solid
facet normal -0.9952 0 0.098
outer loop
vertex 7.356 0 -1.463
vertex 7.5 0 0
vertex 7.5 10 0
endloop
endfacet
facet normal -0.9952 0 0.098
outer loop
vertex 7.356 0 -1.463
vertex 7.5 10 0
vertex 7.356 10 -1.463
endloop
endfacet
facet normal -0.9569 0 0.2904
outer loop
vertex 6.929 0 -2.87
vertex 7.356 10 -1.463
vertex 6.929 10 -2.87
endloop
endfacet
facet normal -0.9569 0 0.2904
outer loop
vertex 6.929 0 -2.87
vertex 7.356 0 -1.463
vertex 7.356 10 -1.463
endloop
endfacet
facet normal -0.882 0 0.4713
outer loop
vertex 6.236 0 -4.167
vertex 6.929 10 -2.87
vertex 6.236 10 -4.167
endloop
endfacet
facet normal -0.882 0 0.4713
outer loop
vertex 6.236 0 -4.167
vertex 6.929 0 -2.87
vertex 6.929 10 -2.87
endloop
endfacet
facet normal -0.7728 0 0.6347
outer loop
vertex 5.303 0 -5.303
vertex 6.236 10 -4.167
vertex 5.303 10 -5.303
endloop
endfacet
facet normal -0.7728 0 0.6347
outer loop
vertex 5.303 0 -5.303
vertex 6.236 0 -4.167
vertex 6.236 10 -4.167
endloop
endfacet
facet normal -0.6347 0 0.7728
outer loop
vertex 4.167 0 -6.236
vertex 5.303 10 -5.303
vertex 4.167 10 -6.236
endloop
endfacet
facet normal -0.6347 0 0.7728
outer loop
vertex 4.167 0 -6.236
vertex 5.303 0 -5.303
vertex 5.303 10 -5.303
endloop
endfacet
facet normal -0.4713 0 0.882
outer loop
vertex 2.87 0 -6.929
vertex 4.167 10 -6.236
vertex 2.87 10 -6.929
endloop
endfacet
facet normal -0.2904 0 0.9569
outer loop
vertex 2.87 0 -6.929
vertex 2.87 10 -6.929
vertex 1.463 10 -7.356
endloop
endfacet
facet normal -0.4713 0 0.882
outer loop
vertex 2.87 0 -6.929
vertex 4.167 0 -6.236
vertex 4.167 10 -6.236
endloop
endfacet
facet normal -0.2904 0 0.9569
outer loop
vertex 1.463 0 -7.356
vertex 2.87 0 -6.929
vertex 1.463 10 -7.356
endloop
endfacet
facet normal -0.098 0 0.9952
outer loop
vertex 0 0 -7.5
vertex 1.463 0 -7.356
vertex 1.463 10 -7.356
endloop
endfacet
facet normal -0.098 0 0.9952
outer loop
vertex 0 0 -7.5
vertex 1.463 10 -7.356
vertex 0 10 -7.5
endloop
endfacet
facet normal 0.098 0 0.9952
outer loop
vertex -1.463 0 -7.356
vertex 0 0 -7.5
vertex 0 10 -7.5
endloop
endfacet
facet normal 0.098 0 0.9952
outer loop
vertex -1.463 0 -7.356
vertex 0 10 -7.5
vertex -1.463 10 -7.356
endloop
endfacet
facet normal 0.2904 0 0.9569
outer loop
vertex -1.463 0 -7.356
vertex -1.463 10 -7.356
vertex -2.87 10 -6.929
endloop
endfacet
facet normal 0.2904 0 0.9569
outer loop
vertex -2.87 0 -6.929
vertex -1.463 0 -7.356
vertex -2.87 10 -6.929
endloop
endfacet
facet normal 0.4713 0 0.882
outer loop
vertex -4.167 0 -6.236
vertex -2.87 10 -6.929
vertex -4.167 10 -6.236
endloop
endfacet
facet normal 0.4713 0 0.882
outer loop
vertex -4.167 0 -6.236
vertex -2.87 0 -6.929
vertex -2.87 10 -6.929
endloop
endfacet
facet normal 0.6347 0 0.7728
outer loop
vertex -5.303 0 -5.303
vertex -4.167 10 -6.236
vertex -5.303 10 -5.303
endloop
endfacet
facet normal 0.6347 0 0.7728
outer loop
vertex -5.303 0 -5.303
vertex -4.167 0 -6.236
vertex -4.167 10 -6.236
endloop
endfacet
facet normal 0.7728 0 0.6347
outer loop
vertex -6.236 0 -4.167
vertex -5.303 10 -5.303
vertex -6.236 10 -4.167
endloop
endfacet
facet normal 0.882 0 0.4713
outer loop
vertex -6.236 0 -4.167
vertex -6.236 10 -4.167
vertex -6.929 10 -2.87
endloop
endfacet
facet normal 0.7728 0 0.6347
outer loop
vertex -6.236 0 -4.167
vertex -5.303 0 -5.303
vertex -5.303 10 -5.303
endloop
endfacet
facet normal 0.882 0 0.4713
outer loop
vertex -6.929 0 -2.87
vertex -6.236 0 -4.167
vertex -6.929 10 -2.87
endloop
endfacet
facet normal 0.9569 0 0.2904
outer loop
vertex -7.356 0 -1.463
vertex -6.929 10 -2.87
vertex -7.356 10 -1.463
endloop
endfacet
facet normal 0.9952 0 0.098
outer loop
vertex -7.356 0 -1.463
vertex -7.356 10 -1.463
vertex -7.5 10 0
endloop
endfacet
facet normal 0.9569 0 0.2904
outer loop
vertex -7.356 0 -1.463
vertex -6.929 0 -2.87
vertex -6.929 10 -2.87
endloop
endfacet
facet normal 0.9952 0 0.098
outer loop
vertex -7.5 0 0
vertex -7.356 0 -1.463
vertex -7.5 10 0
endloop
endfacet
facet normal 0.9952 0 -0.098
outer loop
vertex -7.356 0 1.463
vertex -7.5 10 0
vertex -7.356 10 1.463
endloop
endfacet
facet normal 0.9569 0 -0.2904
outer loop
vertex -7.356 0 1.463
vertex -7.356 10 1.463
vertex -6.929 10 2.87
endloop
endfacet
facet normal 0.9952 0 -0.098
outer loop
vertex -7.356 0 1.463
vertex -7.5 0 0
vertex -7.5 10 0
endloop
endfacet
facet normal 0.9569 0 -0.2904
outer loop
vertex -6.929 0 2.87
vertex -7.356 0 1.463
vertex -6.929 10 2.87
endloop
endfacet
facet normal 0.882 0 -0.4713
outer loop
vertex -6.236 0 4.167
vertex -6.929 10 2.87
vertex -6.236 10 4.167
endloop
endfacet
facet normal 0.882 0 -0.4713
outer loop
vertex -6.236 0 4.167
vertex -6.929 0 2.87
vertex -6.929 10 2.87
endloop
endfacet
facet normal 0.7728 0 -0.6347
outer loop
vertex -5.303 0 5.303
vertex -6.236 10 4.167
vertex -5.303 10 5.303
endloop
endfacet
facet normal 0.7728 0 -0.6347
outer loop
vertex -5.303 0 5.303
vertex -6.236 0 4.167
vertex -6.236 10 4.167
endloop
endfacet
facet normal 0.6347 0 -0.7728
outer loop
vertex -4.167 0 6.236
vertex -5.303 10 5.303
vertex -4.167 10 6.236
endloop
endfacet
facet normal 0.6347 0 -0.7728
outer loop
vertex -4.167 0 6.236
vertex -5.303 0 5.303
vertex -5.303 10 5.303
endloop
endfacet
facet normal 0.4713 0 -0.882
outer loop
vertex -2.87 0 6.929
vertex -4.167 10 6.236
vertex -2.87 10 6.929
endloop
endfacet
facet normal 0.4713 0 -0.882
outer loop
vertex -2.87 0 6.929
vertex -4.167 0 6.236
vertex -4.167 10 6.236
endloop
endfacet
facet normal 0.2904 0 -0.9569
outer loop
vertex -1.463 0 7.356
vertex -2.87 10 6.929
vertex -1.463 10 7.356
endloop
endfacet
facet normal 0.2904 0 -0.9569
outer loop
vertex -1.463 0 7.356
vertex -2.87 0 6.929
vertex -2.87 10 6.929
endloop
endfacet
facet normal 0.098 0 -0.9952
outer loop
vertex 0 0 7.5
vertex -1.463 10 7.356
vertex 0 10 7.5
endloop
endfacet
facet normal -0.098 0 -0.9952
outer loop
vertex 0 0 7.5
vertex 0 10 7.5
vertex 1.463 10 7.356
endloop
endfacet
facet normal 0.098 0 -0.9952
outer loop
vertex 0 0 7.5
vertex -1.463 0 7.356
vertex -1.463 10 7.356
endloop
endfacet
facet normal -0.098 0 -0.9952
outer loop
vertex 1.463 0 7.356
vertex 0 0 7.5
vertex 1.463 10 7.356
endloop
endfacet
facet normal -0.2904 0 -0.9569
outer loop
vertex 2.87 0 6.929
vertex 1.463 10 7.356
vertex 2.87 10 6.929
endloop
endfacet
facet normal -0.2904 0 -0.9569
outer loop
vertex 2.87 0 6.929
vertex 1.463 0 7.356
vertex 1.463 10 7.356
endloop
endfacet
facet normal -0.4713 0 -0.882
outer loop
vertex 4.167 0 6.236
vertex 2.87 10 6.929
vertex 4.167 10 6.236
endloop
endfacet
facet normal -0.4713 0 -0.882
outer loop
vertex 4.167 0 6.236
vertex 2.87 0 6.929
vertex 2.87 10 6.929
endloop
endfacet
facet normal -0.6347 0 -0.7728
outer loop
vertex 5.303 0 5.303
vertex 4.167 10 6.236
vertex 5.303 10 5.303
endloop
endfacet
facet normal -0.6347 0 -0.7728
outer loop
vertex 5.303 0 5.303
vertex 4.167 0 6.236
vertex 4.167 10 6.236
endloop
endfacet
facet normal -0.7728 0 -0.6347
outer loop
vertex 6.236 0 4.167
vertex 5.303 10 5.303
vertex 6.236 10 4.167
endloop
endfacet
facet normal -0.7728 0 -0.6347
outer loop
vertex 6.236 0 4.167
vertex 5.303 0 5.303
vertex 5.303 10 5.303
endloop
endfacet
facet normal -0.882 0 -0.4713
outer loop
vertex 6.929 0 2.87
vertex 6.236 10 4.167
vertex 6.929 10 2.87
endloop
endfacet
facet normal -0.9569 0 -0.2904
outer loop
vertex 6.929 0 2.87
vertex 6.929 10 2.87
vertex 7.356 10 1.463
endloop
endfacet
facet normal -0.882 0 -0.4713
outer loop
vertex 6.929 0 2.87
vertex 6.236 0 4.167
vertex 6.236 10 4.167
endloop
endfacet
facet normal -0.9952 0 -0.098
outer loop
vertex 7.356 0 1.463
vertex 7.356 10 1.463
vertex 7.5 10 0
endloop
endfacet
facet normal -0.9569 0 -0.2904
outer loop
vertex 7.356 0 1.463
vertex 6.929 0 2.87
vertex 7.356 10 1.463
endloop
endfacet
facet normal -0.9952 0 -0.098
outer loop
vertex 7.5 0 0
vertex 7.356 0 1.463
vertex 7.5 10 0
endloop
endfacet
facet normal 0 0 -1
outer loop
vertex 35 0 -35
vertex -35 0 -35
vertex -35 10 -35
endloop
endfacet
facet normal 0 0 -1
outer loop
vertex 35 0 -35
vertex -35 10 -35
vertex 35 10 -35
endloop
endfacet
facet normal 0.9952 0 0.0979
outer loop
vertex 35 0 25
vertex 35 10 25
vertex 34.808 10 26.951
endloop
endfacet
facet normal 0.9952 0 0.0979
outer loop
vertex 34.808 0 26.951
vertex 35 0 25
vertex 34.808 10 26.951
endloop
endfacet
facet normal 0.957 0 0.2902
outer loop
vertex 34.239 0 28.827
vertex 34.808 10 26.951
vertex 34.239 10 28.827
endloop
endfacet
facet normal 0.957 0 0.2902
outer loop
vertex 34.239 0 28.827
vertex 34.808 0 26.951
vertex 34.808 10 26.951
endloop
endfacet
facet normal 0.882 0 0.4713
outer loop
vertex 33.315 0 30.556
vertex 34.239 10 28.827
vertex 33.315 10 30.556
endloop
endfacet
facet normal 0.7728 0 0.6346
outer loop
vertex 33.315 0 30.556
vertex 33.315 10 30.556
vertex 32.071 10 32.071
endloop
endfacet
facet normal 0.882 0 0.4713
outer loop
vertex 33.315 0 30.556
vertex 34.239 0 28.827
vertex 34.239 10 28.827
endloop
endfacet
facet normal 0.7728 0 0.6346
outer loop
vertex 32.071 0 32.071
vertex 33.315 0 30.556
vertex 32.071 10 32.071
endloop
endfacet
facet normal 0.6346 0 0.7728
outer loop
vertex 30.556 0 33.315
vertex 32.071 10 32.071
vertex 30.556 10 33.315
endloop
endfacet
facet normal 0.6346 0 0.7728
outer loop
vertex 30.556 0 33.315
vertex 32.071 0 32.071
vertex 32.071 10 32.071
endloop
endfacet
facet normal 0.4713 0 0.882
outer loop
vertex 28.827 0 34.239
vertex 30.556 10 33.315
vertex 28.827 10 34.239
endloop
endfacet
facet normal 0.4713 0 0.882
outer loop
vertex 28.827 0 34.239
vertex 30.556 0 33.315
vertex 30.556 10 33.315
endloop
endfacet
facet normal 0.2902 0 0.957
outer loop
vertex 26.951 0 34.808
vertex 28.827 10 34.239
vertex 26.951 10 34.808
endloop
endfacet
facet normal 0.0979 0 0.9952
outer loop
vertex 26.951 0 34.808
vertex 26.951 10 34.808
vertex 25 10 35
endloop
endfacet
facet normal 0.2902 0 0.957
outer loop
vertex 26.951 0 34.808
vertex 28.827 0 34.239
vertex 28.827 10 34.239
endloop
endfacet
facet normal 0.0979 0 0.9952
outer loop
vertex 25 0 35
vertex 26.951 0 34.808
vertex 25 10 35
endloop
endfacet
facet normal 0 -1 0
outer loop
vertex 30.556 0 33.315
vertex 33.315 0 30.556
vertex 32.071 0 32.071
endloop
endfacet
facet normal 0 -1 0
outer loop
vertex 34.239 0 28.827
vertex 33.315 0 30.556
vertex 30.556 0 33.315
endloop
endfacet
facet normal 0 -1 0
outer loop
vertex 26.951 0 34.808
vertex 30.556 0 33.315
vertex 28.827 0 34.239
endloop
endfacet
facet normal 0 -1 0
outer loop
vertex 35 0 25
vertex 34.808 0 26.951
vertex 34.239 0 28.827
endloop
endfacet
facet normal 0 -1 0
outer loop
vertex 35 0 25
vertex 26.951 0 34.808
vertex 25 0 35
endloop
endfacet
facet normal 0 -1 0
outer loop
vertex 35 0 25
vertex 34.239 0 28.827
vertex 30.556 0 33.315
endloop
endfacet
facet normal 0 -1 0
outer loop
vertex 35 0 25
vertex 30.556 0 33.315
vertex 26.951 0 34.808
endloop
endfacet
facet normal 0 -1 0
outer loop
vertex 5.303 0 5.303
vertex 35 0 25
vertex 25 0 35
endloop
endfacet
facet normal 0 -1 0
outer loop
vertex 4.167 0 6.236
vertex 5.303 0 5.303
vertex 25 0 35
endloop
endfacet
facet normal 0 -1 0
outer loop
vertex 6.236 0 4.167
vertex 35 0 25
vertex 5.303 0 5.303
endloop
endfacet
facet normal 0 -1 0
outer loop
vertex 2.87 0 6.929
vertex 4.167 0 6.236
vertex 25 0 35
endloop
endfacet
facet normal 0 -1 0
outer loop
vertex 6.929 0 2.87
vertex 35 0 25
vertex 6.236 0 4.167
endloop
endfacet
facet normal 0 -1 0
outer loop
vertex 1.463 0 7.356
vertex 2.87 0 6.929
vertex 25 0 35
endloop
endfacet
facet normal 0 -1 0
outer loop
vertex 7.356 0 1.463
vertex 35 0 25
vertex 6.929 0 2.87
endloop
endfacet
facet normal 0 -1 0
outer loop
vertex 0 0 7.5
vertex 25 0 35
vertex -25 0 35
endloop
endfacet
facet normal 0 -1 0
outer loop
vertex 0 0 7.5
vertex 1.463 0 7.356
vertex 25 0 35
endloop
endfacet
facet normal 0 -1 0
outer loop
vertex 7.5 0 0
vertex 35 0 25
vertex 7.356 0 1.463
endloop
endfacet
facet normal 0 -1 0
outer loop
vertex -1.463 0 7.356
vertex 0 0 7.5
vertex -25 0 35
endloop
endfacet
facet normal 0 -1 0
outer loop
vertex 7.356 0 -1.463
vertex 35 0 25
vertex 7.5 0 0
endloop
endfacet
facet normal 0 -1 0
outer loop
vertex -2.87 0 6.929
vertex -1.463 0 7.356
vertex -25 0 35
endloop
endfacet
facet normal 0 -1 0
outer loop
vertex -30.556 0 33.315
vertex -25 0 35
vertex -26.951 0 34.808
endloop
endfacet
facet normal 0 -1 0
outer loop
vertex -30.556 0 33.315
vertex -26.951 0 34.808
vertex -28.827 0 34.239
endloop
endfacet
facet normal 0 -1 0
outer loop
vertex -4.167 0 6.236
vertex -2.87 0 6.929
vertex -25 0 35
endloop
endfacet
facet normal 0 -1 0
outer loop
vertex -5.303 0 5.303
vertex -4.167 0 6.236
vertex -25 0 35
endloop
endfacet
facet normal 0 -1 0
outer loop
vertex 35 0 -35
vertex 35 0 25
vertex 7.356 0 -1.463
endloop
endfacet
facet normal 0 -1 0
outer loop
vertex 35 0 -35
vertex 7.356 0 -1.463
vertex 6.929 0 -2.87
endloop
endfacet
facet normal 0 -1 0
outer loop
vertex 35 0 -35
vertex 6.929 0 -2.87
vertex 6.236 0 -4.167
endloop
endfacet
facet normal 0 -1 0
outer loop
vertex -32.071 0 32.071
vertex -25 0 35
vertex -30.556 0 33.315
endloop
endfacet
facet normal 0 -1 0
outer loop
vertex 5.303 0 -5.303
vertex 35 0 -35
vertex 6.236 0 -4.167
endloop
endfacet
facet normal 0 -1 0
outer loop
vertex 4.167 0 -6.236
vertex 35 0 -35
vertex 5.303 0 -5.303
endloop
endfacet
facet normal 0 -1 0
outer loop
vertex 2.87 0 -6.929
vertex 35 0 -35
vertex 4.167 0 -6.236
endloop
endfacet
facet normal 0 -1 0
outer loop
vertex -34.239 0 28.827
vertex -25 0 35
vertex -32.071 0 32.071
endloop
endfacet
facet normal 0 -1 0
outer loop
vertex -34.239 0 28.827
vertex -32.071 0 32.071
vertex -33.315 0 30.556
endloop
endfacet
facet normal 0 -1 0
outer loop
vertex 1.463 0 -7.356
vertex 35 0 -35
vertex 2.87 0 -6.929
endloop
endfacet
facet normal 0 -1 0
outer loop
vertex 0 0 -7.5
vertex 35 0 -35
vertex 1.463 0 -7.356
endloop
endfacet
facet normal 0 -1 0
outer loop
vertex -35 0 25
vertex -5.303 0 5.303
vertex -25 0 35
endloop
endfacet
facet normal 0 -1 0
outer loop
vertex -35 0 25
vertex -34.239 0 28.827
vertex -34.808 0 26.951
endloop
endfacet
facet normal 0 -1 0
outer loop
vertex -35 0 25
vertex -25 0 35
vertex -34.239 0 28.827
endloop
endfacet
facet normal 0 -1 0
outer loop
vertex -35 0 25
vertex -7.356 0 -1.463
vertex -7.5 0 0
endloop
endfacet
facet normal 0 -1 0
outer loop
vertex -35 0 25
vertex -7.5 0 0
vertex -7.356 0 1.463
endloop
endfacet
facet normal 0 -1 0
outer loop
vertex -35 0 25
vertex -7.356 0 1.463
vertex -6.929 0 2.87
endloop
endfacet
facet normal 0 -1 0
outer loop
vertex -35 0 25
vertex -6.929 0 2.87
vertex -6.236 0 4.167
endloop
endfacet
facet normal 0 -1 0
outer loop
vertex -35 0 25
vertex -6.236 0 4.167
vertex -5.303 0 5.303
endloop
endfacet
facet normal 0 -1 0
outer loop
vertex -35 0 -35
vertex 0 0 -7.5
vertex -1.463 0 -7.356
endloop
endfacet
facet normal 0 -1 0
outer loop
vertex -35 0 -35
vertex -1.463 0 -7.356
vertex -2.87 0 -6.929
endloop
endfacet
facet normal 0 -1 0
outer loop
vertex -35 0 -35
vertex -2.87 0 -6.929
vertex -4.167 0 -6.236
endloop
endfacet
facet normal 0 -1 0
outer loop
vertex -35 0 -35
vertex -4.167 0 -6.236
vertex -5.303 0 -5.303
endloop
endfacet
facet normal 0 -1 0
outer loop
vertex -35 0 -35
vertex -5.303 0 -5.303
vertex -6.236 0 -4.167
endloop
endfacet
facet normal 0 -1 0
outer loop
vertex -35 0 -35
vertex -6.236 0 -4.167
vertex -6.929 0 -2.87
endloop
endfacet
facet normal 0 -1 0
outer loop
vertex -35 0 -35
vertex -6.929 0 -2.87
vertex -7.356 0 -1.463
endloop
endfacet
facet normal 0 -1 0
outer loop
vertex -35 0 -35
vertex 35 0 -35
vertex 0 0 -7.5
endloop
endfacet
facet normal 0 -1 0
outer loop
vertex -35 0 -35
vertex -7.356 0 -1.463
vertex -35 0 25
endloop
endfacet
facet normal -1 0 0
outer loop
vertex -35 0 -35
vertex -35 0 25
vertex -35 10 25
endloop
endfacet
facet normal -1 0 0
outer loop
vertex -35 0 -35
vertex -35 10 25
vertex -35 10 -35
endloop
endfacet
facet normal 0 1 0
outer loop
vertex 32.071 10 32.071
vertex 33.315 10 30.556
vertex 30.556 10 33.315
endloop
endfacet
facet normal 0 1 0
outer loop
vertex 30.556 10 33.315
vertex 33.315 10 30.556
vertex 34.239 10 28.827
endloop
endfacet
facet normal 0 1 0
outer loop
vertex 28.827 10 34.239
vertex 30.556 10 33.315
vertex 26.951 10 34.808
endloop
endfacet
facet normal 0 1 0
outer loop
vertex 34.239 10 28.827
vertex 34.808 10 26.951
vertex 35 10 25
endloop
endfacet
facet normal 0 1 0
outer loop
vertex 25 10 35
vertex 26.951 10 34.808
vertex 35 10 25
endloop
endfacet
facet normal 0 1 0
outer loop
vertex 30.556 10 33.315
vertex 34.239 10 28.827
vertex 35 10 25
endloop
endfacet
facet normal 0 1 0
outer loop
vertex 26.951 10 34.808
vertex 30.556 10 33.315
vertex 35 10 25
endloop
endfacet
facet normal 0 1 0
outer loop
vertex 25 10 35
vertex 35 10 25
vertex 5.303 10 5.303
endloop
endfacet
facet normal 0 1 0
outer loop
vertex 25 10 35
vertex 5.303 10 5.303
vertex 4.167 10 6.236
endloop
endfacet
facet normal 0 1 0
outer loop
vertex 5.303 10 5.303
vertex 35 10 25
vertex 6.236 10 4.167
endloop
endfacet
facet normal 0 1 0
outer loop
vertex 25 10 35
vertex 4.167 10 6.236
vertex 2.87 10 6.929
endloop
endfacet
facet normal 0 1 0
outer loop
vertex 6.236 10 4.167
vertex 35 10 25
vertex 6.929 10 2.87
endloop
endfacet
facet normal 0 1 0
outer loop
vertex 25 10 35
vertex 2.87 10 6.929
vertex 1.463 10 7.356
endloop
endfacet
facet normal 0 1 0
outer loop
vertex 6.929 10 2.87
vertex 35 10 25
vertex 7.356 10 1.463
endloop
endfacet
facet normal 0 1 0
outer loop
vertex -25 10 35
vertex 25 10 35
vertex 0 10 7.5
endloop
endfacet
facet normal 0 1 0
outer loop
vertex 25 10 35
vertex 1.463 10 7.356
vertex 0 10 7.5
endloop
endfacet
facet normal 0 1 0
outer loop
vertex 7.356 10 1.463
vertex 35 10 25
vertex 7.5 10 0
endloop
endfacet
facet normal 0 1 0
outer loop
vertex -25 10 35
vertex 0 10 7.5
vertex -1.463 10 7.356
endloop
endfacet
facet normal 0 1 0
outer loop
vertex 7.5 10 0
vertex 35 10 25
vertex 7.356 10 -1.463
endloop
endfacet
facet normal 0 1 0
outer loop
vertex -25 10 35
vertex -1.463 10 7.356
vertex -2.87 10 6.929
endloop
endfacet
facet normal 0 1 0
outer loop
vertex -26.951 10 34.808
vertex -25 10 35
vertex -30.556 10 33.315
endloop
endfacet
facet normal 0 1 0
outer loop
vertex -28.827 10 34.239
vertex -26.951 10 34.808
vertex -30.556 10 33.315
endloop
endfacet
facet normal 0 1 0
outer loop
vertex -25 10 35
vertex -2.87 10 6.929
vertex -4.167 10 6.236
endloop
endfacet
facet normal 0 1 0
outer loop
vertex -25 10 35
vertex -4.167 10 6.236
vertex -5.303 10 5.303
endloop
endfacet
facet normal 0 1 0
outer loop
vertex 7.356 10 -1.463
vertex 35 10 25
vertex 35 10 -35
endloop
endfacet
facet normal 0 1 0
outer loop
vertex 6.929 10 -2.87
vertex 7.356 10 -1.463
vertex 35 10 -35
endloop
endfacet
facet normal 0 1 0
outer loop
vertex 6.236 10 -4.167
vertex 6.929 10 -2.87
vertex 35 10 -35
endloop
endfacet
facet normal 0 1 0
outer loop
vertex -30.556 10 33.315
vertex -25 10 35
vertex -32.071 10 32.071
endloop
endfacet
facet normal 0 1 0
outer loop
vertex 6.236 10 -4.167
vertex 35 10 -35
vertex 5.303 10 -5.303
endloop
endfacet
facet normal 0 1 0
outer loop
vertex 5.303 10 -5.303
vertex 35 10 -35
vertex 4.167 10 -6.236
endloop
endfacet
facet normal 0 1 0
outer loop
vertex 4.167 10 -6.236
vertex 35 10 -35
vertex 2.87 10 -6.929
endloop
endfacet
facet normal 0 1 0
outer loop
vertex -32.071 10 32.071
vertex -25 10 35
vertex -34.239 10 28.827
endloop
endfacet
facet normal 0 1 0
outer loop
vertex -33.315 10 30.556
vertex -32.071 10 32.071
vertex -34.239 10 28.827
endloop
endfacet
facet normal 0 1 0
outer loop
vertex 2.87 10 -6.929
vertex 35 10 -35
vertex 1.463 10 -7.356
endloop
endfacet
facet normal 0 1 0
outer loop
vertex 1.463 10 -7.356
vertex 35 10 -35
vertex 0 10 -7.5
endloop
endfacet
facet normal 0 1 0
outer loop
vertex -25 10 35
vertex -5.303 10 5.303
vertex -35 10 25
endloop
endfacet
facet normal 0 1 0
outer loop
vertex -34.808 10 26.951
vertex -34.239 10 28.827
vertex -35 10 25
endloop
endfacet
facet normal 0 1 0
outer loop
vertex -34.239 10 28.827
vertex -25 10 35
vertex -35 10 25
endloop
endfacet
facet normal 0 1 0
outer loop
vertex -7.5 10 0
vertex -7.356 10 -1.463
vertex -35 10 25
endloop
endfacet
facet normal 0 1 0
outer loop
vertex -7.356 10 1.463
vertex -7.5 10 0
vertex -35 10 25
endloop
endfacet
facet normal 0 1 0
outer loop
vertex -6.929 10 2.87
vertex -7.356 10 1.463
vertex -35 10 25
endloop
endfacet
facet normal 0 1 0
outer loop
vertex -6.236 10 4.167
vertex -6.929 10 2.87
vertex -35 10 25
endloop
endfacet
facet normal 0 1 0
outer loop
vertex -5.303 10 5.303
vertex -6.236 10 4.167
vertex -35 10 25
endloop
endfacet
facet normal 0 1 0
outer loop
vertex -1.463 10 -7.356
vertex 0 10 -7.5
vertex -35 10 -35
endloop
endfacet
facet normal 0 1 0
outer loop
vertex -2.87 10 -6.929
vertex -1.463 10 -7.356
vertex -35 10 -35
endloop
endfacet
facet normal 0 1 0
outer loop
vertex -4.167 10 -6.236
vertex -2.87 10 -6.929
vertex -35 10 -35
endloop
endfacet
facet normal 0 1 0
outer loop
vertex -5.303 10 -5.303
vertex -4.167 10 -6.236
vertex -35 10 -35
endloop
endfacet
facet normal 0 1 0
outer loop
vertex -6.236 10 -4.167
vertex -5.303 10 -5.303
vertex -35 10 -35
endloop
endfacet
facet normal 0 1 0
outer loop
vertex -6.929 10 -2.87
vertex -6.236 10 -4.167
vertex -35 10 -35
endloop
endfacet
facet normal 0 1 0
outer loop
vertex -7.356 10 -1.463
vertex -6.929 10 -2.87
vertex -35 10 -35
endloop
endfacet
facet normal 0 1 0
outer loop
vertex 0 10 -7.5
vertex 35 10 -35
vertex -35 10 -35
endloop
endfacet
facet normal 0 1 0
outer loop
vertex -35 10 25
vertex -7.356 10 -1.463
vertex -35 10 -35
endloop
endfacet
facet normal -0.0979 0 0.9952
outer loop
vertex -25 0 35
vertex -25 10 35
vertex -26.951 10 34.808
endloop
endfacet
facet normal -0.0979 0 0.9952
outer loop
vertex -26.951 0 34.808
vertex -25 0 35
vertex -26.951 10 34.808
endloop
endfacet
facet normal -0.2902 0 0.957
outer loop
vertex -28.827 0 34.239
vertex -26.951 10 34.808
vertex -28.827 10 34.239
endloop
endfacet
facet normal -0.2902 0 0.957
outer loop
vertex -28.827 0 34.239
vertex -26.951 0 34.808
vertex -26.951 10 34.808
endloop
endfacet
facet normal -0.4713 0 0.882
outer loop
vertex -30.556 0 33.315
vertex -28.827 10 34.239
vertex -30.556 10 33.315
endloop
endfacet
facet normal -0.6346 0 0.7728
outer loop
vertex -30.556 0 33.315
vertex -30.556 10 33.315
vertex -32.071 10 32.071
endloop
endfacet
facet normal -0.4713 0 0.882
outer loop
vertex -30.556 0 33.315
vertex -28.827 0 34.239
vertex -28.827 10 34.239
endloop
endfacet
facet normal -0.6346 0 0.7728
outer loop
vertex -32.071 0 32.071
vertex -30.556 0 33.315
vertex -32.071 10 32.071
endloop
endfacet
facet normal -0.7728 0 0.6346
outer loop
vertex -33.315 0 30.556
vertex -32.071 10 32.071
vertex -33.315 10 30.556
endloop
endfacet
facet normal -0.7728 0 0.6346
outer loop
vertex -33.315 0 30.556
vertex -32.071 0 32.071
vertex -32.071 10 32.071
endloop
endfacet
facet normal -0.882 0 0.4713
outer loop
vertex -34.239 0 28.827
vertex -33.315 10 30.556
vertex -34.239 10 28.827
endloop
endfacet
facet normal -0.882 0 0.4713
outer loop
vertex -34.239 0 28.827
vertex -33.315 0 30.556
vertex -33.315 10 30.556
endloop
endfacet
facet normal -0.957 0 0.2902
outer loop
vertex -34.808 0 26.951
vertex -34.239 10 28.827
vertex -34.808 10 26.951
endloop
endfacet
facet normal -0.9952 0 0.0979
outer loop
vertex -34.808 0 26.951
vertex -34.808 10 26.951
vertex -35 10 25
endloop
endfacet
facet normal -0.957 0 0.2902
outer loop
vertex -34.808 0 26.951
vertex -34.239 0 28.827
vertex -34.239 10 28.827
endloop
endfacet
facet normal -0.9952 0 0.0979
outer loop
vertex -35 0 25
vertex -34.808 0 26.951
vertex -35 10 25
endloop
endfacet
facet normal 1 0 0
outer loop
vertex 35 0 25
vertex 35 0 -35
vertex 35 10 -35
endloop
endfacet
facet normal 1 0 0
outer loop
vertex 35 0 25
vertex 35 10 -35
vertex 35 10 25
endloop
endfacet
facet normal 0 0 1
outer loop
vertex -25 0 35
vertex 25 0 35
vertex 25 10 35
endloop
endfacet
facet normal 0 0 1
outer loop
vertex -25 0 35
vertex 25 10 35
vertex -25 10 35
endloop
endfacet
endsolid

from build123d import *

# Parameters (mm, degrees)
CROQUIS1_R              = 7.5
SALIENTE_EXTRUIR1_DEPTH = 10


with BuildPart() as part:
    # Croquis1 → Saliente-Extruir1 (new body)
    with BuildSketch(Plane(origin=(0, 0, 0), x_dir=(1, 0, 0), z_dir=(0, 1, 0))):
        with BuildLine():
            Line((-35, 35), (35, 35))
            Line((35, 35), (35, -25))
            ThreePointArc((35, -25), (32.071067812, -32.071067812), (25, -35))
            Line((25, -35), (-25, -35))
            ThreePointArc((-25, -35), (-32.071067812, -32.071067812), (-35, -25))
            Line((-35, -25), (-35, 35))
        make_face()
        Circle(CROQUIS1_R, mode=Mode.SUBTRACT)
    extrude(amount=SALIENTE_EXTRUIR1_DEPTH)


solid = part.part
